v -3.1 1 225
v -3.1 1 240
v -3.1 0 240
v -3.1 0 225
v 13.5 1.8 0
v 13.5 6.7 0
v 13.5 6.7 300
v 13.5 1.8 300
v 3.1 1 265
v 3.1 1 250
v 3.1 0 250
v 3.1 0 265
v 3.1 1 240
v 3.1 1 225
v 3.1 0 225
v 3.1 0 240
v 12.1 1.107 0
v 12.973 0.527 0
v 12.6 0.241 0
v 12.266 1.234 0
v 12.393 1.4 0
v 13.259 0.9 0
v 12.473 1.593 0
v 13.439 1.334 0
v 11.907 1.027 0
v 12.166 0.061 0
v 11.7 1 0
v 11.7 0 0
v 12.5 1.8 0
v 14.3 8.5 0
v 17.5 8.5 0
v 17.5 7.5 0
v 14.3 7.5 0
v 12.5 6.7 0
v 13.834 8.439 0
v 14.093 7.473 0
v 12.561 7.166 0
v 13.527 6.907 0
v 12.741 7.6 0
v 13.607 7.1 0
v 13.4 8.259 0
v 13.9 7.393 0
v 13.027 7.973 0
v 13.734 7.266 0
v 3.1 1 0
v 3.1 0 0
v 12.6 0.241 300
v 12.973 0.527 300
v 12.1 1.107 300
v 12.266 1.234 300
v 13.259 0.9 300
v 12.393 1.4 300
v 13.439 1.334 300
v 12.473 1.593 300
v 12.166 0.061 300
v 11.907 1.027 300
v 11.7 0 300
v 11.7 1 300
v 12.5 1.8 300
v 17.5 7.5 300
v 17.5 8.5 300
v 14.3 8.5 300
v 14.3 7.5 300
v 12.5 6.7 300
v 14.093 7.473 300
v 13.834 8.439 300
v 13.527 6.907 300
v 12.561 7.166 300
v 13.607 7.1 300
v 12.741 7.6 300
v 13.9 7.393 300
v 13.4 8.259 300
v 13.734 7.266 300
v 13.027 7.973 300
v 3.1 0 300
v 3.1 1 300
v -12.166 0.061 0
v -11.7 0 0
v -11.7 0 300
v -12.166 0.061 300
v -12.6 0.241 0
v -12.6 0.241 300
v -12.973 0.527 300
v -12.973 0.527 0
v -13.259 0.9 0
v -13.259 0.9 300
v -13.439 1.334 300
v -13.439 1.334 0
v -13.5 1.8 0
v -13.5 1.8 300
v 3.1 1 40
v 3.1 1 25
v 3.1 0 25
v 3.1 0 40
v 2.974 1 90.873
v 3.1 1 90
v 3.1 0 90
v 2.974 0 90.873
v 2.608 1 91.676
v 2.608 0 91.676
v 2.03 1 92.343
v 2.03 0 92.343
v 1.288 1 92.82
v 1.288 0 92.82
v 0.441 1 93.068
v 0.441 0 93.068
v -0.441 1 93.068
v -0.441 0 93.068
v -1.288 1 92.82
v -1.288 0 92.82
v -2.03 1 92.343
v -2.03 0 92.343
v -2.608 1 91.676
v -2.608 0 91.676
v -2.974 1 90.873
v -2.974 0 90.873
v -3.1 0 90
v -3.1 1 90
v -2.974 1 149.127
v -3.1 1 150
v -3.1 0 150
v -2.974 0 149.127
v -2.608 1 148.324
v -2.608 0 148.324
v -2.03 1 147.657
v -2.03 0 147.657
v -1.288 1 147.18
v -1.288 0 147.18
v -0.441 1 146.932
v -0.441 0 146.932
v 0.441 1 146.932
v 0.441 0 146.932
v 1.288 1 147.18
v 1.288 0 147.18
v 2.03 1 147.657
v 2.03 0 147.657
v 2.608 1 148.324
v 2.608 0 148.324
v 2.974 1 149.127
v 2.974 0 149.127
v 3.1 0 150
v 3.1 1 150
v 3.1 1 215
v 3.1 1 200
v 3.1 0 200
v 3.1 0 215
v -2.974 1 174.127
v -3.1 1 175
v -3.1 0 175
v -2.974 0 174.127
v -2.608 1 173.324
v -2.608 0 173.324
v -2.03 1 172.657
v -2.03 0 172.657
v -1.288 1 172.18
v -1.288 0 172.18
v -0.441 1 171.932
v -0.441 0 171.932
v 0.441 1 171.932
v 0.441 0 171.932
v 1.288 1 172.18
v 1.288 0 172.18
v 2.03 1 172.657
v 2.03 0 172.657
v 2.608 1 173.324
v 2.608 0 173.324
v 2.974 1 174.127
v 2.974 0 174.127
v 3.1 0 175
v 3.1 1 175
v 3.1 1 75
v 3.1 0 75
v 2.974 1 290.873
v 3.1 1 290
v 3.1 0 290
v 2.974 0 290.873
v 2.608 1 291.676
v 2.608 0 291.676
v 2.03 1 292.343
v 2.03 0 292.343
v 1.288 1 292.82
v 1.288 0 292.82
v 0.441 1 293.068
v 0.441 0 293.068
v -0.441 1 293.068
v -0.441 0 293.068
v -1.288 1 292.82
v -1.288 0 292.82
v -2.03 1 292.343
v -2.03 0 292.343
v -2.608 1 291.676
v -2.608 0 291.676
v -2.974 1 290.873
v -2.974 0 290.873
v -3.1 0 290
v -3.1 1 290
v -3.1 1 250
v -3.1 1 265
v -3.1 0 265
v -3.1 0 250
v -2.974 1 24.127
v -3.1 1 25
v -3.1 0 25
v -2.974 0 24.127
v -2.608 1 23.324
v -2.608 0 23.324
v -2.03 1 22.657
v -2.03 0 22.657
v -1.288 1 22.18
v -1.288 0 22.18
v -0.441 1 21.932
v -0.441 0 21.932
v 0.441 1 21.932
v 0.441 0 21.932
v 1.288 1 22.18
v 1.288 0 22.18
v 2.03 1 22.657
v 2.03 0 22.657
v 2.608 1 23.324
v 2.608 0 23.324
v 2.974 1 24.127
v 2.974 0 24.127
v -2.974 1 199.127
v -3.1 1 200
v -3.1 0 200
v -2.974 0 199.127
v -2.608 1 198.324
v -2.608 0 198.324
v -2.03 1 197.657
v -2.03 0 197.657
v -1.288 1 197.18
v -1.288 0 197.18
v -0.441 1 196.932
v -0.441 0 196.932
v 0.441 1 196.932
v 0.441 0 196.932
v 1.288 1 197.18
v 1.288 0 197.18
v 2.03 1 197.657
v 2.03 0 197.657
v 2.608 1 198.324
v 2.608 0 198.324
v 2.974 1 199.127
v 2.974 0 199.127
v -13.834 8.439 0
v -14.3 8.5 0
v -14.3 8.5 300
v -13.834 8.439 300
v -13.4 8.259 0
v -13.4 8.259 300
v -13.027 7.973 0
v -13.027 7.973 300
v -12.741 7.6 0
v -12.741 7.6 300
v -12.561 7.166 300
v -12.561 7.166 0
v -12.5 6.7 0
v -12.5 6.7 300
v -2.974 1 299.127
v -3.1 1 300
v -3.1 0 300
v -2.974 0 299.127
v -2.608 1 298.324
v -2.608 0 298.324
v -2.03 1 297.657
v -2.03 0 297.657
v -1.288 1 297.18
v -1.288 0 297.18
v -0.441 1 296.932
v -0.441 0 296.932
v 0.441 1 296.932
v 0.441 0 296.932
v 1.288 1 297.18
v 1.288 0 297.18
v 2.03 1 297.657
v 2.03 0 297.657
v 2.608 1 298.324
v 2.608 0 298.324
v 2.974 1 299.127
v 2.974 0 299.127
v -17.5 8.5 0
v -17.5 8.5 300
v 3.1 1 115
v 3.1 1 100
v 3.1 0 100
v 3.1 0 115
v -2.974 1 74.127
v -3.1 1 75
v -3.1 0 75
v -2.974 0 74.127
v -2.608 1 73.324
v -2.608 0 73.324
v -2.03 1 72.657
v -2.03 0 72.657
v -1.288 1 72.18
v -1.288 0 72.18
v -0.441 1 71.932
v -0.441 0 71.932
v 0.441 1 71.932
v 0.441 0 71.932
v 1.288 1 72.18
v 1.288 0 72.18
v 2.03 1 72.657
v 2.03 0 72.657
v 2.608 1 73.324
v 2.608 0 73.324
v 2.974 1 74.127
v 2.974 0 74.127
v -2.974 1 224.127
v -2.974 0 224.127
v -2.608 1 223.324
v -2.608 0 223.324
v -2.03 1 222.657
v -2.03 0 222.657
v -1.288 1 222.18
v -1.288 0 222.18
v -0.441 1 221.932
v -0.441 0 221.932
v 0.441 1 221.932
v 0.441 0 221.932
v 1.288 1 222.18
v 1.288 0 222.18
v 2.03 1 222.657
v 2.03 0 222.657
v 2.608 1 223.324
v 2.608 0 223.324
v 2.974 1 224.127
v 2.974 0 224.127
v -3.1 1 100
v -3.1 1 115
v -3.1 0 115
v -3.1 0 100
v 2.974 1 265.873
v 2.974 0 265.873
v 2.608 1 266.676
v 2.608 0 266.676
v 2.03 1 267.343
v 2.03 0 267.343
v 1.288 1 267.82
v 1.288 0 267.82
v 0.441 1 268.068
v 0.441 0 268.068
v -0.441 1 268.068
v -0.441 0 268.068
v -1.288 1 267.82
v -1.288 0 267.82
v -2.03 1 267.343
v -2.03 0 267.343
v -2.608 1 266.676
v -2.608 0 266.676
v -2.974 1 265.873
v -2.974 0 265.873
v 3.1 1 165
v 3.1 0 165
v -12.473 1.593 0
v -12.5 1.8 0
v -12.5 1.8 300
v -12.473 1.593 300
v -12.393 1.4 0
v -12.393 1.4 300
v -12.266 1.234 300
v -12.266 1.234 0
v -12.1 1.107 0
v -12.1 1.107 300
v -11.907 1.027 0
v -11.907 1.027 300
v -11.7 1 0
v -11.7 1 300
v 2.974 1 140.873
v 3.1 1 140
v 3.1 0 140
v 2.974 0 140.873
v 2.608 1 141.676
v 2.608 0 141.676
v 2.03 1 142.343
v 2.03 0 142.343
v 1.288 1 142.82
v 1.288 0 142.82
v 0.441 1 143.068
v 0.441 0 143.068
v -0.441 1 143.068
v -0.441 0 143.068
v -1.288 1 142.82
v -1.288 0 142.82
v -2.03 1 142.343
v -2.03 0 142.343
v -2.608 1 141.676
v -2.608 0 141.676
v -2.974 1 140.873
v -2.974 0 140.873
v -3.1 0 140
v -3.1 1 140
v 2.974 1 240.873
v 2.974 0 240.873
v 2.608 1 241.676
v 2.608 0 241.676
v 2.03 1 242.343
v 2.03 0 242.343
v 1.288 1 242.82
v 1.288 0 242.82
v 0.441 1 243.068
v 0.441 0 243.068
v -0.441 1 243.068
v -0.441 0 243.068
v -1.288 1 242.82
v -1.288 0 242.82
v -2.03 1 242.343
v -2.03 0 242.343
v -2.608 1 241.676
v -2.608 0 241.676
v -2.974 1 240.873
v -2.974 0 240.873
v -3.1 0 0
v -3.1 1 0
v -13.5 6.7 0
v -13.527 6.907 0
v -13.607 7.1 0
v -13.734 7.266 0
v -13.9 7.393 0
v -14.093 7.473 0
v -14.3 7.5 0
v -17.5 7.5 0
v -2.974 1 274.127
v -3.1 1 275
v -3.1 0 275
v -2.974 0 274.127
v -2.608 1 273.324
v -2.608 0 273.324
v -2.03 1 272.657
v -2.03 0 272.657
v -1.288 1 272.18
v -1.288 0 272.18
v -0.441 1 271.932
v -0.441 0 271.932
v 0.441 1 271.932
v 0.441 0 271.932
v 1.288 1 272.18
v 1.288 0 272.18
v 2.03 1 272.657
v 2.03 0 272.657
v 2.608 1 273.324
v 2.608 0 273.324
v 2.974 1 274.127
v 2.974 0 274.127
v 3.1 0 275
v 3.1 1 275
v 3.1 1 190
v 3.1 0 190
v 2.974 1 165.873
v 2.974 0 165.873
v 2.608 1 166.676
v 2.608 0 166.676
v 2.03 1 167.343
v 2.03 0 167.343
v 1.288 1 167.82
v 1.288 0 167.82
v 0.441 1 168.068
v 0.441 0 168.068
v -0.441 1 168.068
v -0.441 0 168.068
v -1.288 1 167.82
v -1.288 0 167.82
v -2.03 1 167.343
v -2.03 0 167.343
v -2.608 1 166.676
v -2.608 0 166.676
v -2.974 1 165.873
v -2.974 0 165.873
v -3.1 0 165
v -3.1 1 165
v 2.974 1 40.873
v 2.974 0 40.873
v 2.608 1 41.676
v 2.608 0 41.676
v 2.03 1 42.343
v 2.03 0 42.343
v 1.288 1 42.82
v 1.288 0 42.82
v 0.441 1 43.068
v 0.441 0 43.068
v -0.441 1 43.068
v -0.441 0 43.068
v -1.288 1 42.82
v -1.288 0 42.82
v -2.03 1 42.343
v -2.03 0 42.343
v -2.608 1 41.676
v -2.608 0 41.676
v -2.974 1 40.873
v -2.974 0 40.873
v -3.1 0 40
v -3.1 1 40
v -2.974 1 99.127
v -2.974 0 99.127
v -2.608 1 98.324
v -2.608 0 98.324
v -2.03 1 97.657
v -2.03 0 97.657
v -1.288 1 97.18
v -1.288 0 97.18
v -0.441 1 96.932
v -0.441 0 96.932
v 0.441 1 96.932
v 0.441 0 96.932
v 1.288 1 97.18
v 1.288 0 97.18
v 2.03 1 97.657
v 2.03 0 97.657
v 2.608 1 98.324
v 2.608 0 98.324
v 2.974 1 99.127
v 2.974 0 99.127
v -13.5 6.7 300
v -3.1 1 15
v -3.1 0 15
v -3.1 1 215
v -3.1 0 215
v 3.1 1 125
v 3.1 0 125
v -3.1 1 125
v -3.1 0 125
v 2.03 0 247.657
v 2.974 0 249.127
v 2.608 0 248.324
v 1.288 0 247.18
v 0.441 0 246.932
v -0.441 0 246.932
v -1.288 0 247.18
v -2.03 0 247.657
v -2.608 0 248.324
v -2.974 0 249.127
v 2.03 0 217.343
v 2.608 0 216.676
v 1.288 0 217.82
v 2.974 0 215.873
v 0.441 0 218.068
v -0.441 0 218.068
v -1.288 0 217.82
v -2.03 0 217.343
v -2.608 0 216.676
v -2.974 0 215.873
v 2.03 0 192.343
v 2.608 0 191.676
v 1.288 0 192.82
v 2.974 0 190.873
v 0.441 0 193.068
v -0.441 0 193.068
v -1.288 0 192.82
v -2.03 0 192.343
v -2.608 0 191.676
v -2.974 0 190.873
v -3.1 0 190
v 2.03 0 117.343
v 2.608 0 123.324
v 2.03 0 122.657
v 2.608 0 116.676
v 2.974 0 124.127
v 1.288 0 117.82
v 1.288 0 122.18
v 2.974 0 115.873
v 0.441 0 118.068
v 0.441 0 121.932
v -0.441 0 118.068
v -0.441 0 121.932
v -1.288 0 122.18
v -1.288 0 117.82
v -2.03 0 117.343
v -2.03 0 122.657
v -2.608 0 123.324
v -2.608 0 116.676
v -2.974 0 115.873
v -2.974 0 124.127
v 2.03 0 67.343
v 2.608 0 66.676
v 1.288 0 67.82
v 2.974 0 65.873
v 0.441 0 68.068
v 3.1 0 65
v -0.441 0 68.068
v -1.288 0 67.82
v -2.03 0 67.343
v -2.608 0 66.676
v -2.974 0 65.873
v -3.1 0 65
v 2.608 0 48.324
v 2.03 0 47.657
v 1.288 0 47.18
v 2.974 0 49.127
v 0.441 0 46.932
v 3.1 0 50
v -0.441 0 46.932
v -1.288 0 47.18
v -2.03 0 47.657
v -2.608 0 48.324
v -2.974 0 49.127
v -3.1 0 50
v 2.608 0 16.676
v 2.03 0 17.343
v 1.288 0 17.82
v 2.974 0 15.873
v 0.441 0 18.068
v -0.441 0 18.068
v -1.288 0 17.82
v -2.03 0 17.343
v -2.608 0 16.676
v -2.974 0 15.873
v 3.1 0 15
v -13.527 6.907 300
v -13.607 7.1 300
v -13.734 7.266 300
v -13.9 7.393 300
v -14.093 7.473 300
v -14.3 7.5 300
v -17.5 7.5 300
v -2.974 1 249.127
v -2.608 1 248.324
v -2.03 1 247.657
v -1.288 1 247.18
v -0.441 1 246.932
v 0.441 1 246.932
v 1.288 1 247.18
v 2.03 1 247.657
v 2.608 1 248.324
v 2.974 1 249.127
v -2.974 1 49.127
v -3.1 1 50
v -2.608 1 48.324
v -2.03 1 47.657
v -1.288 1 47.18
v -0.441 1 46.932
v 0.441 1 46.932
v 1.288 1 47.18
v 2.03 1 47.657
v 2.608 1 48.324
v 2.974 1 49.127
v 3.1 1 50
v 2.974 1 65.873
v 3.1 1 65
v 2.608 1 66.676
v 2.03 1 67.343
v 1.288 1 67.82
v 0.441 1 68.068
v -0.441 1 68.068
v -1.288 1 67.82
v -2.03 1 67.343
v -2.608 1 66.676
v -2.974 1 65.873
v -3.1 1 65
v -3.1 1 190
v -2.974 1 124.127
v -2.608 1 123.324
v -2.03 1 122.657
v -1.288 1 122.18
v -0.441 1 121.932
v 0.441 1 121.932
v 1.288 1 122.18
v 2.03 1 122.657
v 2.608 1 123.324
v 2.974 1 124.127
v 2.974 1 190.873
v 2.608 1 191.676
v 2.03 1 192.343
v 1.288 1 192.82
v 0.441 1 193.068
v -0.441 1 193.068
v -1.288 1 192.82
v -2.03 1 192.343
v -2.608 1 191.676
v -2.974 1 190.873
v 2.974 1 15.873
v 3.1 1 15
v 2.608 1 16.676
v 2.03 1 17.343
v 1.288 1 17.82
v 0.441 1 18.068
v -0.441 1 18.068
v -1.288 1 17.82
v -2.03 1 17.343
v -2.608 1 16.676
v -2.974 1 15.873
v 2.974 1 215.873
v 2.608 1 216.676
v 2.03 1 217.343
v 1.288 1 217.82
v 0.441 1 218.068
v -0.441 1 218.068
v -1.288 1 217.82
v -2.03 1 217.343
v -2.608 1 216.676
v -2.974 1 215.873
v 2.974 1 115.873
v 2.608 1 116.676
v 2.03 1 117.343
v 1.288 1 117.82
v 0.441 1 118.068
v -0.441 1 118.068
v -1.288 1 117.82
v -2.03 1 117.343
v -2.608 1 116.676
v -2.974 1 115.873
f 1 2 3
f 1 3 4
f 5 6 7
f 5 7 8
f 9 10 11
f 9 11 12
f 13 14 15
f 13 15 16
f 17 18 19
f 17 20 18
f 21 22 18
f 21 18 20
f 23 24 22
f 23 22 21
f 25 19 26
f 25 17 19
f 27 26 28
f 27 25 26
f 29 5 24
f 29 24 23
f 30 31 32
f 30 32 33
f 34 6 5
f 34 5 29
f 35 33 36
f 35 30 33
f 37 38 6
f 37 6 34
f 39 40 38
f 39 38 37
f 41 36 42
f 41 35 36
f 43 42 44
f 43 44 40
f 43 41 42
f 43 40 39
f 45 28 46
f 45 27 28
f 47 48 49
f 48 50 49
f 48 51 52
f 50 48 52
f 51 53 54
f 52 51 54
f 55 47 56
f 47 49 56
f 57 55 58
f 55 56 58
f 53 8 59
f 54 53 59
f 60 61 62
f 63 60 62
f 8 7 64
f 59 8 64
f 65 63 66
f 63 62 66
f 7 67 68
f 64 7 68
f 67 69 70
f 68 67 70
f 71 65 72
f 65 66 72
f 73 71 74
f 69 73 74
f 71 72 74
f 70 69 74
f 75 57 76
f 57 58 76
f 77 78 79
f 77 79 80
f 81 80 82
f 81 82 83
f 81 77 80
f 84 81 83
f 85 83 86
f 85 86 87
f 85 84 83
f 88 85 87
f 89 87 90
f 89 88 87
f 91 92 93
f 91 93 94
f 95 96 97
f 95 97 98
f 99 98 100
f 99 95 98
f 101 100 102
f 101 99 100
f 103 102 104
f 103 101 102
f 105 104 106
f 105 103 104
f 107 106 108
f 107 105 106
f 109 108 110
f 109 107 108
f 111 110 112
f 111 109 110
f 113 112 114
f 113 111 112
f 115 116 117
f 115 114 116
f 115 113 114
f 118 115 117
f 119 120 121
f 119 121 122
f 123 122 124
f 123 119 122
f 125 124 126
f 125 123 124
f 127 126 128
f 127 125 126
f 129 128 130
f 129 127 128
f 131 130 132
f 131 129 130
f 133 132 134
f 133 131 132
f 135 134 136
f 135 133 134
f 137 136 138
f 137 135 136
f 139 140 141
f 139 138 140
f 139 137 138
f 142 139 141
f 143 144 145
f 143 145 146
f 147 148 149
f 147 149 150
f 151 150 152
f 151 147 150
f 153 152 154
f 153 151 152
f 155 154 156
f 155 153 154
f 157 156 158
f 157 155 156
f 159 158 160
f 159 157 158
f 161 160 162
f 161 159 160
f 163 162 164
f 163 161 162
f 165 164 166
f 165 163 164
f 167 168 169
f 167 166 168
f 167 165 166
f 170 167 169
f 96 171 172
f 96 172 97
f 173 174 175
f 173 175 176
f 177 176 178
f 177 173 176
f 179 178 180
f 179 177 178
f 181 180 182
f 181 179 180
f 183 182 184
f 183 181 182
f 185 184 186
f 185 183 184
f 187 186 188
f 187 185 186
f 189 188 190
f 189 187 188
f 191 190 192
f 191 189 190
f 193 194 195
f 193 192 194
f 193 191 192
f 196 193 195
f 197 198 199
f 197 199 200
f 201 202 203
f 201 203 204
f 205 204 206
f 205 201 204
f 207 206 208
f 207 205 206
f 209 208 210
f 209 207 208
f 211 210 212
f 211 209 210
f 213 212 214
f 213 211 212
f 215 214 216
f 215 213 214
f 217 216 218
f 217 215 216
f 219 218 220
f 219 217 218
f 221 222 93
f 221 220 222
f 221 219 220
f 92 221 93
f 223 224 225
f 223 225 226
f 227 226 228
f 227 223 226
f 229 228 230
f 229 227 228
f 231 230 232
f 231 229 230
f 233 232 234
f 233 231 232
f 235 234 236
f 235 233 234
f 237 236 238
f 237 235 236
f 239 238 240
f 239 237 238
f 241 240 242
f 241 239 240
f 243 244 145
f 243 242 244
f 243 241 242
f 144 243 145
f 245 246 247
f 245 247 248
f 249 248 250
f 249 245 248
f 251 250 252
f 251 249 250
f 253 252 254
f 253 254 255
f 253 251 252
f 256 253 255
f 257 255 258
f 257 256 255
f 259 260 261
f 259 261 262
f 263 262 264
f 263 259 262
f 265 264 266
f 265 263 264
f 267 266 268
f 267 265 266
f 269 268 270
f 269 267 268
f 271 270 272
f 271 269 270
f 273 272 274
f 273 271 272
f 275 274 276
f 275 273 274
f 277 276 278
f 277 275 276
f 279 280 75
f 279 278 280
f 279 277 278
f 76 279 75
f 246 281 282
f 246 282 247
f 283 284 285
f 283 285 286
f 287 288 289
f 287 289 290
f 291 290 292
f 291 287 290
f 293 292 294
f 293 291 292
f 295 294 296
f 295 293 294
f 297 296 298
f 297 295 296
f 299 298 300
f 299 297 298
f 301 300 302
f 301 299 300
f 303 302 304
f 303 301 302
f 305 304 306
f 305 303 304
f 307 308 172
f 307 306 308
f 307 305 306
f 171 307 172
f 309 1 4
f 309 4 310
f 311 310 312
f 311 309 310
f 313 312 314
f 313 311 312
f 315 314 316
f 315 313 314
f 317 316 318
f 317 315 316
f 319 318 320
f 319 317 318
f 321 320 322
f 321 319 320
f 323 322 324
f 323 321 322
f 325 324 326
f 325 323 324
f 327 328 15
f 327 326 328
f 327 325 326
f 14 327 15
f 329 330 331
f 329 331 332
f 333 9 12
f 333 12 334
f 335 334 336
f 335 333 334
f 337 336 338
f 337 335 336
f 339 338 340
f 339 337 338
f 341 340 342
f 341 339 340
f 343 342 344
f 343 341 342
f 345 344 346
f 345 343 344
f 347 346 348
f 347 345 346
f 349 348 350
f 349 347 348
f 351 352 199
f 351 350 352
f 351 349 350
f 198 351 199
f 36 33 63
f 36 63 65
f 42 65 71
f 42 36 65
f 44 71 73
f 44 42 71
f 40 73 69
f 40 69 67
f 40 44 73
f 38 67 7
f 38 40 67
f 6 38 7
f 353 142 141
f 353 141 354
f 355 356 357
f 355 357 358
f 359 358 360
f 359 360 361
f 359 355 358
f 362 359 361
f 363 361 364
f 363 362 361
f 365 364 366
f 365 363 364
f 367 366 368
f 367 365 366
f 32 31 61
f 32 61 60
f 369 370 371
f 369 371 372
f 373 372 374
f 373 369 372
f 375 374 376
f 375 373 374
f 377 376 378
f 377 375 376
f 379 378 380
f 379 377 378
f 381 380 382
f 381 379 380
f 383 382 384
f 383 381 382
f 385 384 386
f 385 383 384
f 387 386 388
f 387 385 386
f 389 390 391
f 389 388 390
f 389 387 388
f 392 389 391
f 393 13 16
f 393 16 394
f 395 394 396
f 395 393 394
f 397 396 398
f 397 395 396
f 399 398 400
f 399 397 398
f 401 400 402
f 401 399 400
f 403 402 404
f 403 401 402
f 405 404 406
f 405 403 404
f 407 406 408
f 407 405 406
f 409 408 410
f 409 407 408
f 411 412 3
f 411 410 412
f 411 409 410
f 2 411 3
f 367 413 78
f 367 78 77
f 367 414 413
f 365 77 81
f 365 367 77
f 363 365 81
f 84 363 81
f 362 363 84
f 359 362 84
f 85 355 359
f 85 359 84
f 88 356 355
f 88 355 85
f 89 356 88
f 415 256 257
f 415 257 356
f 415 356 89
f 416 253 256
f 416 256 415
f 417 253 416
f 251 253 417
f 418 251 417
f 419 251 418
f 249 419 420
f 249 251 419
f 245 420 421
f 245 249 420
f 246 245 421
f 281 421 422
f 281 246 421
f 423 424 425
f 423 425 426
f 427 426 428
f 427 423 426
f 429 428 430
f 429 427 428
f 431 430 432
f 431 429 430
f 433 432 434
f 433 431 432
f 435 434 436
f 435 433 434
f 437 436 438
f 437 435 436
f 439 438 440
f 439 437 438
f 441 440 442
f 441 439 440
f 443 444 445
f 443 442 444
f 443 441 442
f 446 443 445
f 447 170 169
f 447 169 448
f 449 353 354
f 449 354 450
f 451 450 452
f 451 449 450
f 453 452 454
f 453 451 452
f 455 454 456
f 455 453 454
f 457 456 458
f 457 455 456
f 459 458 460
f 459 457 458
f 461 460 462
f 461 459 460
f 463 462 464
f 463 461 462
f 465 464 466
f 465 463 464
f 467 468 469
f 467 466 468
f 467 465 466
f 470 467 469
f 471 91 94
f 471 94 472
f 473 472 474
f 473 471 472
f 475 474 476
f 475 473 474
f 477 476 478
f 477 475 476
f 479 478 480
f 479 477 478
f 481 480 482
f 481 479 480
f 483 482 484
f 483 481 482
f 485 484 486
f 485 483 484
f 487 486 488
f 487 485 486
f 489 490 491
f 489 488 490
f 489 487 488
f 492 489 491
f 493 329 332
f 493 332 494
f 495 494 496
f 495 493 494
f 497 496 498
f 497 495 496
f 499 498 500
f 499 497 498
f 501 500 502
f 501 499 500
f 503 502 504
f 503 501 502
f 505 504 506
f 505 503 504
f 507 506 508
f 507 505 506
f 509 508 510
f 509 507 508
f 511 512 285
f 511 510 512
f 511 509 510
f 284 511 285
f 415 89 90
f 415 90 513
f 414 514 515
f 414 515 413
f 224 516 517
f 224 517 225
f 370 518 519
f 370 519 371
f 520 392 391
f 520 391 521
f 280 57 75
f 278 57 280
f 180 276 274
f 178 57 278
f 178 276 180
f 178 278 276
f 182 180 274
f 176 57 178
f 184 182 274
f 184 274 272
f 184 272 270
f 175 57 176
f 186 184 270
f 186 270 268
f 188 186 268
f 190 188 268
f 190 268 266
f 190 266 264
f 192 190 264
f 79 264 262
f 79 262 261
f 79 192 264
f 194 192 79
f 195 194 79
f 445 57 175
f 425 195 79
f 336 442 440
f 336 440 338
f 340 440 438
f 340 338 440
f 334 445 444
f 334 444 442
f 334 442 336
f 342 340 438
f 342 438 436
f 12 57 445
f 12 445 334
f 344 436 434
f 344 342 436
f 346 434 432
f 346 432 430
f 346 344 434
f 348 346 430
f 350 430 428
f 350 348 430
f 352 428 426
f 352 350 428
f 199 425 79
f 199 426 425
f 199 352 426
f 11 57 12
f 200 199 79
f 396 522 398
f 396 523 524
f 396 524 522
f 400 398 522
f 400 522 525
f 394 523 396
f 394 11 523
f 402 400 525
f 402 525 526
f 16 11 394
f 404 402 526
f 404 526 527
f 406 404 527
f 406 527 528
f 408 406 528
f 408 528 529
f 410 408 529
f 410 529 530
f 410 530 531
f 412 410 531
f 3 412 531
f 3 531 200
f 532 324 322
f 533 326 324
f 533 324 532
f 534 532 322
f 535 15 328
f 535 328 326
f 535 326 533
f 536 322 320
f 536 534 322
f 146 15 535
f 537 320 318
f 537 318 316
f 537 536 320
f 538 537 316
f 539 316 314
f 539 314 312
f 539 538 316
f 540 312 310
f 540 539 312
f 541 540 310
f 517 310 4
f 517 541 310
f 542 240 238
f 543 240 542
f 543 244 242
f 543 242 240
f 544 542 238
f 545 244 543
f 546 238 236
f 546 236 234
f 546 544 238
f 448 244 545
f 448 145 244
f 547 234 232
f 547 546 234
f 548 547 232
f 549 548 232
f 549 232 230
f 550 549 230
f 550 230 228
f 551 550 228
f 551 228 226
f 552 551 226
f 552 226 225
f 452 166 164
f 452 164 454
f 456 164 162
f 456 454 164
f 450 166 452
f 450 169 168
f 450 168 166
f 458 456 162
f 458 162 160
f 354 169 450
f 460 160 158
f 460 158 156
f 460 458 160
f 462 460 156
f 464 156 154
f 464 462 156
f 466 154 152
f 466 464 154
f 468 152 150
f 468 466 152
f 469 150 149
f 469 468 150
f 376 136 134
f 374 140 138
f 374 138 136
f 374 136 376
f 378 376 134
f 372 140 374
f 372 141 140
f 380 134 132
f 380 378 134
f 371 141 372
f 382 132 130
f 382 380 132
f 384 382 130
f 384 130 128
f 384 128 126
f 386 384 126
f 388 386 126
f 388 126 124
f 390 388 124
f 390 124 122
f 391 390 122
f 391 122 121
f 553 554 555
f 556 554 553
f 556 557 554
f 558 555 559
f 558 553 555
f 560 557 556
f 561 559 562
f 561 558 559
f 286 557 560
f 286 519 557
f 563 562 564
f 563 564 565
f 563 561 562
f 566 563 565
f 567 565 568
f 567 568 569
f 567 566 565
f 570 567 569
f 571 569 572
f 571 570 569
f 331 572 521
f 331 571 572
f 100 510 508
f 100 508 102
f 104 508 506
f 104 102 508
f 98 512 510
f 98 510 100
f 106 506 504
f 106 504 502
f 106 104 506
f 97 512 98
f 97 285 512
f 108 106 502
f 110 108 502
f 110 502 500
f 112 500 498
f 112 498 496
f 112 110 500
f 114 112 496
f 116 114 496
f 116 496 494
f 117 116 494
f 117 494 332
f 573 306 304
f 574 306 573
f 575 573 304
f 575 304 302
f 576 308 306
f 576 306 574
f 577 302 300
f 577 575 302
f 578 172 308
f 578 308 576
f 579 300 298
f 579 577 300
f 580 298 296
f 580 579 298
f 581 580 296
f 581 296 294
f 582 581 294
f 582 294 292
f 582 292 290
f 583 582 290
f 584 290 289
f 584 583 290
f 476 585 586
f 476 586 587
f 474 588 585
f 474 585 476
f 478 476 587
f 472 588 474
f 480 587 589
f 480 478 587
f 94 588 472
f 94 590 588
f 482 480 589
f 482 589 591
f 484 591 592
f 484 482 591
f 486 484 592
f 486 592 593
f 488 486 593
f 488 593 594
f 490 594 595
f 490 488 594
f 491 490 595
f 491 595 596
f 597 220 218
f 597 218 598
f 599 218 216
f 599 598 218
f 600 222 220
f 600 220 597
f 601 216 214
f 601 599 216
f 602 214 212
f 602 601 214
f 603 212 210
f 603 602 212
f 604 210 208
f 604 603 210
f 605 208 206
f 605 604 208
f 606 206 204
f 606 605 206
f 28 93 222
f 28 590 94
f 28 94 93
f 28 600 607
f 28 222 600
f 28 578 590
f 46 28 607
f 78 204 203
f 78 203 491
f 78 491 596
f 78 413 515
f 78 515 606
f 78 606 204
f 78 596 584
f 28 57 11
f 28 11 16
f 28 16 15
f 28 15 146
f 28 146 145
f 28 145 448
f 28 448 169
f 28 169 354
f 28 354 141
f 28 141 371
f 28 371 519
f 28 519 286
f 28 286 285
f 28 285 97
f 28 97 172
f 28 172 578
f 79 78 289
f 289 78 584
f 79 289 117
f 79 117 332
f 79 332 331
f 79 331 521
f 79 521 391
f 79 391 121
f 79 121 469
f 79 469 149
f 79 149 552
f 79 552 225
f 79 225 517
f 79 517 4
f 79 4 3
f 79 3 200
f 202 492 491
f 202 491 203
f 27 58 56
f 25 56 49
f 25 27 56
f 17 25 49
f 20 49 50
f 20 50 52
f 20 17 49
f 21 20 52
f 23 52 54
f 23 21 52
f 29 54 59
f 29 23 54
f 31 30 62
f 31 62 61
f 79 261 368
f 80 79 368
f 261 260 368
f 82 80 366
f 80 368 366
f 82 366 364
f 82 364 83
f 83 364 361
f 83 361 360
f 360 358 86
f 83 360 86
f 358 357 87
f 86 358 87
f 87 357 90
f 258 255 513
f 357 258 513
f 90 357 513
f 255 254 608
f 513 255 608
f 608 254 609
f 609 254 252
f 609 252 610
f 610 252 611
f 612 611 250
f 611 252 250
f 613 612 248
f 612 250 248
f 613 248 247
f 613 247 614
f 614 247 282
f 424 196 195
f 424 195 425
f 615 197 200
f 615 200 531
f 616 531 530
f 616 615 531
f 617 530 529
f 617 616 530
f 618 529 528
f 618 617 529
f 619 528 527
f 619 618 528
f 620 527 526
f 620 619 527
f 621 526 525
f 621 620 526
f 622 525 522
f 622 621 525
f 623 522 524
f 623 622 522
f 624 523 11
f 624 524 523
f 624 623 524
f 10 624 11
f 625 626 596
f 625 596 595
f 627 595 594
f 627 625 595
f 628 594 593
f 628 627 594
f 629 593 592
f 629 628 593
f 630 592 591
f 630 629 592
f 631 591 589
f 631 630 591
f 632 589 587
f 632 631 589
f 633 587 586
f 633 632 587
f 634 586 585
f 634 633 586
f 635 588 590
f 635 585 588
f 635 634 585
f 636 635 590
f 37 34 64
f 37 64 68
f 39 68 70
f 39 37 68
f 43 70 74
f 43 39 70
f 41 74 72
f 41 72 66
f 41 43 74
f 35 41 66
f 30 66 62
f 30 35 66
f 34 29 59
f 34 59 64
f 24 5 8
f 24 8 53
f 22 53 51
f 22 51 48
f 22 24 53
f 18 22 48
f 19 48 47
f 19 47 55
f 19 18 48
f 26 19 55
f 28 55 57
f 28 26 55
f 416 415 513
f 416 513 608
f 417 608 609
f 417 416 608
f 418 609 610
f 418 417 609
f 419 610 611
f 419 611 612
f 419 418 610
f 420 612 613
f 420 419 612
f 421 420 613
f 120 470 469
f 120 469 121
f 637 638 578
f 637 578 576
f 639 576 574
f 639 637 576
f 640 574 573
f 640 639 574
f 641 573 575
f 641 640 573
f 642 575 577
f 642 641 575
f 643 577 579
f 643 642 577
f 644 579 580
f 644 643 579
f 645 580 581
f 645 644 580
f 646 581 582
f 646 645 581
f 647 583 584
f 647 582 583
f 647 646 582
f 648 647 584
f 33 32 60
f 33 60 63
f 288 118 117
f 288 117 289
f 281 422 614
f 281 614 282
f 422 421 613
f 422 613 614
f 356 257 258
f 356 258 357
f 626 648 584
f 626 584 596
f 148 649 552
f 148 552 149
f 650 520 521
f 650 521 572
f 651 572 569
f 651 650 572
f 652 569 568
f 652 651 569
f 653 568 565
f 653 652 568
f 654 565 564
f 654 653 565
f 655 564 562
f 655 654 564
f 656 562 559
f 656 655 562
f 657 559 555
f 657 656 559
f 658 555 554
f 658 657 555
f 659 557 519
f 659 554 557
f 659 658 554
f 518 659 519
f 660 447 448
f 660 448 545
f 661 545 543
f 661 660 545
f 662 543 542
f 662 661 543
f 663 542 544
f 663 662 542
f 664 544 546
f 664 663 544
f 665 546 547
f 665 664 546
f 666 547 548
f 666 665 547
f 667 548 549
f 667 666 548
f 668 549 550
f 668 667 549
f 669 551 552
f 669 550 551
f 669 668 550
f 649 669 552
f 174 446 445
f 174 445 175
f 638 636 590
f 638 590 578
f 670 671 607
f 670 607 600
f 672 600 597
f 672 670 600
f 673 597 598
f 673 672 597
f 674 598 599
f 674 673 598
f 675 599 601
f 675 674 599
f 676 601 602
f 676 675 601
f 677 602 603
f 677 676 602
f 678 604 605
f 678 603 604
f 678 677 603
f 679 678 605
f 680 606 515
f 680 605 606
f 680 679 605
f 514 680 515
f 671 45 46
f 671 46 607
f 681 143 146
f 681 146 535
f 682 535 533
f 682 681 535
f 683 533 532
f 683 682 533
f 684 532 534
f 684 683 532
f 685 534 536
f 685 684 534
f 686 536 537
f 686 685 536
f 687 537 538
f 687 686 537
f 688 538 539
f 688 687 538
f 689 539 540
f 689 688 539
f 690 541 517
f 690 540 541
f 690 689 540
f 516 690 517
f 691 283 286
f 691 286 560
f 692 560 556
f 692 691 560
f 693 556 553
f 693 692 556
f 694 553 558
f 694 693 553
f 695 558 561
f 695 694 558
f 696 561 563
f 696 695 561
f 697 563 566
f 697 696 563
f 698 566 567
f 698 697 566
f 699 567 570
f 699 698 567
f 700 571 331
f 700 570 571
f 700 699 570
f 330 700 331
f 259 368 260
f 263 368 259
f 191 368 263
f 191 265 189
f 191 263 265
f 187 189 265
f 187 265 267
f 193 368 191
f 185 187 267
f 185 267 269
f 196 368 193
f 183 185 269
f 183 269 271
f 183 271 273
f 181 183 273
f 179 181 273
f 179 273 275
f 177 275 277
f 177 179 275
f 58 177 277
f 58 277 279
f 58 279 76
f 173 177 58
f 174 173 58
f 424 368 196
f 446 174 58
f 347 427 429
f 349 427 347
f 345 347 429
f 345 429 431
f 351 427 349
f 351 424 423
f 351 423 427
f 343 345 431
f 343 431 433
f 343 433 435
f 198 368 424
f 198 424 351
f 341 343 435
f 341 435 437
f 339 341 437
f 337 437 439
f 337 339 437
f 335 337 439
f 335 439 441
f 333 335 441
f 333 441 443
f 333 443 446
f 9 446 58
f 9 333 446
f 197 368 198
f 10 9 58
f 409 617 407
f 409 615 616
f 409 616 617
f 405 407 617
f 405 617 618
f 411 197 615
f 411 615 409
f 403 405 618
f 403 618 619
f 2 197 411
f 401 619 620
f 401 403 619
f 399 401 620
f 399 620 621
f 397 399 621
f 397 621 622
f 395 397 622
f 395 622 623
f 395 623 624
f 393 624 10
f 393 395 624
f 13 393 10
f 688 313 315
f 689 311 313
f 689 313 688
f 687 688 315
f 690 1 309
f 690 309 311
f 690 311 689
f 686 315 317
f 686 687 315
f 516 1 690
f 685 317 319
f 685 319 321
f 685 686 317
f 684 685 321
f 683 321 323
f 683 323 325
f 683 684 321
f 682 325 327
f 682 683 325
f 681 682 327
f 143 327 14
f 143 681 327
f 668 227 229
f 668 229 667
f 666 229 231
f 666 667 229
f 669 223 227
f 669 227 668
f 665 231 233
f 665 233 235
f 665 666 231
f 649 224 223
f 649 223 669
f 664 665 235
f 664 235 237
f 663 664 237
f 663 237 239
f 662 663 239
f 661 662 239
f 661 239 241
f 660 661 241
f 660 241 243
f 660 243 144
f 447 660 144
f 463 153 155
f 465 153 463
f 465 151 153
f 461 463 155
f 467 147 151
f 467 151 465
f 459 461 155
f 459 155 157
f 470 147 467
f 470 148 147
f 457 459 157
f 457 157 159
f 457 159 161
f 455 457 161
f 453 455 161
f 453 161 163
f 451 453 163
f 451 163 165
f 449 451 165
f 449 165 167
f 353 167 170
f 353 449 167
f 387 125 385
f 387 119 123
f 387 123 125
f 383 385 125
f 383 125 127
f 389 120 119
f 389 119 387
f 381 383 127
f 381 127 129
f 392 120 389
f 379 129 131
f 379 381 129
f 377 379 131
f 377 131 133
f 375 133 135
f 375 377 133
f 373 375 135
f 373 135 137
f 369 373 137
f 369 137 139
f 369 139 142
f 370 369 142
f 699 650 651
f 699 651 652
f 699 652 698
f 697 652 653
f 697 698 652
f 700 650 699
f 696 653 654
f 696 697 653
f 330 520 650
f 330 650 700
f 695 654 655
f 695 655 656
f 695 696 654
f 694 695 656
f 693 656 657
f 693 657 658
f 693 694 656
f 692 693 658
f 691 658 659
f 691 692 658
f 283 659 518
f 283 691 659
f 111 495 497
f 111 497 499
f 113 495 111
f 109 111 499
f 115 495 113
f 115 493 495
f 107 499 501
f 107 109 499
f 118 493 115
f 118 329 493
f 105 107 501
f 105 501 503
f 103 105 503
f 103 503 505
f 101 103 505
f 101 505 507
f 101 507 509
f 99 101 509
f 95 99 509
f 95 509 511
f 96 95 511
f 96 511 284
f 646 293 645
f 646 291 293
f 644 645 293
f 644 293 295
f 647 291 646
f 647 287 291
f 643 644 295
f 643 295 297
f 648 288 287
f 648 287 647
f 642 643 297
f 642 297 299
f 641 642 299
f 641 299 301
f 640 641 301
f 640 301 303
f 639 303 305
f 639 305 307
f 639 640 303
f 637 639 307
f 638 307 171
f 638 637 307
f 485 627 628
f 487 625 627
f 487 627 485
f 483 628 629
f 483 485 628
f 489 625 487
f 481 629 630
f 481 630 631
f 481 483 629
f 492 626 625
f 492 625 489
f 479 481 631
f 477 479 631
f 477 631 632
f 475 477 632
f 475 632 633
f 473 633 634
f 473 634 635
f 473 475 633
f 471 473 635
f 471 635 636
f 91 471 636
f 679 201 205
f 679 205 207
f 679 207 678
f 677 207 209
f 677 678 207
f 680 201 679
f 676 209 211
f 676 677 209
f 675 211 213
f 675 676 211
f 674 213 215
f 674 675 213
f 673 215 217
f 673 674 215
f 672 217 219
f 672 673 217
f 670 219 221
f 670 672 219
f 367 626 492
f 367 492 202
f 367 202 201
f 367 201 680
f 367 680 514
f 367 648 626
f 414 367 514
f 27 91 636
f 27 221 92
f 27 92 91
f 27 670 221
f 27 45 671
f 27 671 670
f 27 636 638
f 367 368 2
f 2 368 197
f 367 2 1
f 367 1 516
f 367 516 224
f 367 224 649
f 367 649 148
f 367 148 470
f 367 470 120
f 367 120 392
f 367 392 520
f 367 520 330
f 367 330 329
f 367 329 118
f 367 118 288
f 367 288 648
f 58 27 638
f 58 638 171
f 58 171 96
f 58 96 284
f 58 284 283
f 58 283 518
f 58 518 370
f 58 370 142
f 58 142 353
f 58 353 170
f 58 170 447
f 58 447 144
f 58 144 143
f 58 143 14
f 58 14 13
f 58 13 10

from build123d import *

# Parameters (mm, degrees)
BOSS_EXTRUDE2_DEPTH = 300
CUT_EXTRUDE1_DEPTH  = 100


with BuildPart() as part:
    # Sketch1 → Boss-Extrude2 (new body)
    with BuildSketch(Plane.XY):
        with BuildLine():
            Line((0, 0), (-11.7, 0))
            ThreePointArc((-11.7, 0), (-12.972792206, 0.527207794), (-13.5, 1.8))
            Line((-13.5, 1.8), (-13.5, 6.7))
            ThreePointArc((-13.5, 6.7), (-13.734314575, 7.265685425), (-14.3, 7.5))
            Line((-14.3, 7.5), (-17.5, 7.5))
            Line((-17.5, 7.5), (-17.5, 8.5))
            Line((-17.5, 8.5), (-14.3, 8.5))
            ThreePointArc((-14.3, 8.5), (-13.027207794, 7.972792206), (-12.5, 6.7))
            Line((-12.5, 6.7), (-12.5, 1.8))
            ThreePointArc((-12.5, 1.8), (-12.265685425, 1.234314575), (-11.7, 1))
            Line((-11.7, 1), (0, 1))
            Line((0, 1), (11.7, 1))
            ThreePointArc((11.7, 1), (12.265685425, 1.234314575), (12.5, 1.8))
            Line((12.5, 1.8), (12.5, 6.7))
            ThreePointArc((12.5, 6.7), (13.027207794, 7.972792206), (14.3, 8.5))
            Line((14.3, 8.5), (17.5, 8.5))
            Line((17.5, 8.5), (17.5, 7.5))
            Line((17.5, 7.5), (14.3, 7.5))
            ThreePointArc((14.3, 7.5), (13.734314575, 7.265685425), (13.5, 6.7))
            Line((13.5, 6.7), (13.5, 1.8))
            ThreePointArc((13.5, 1.8), (12.972792206, 0.527207794), (11.7, 0))
            Line((11.7, 0), (0, 0))
        make_face()
    extrude(amount=BOSS_EXTRUDE2_DEPTH)

    # Sketch2 → Cut-Extrude1 (cut)
    with BuildSketch(Plane(origin=(0, 1, 0), x_dir=(1, 0, 0), z_dir=(0, 1, 0))):
        with BuildLine():
            Line((-3.1, -290), (-3.1, -275))
            ThreePointArc((-3.1, -275), (0, -271.9), (3.1, -275))
            Line((3.1, -275), (3.1, -290))
            ThreePointArc((3.1, -290), (0, -293.1), (-3.1, -290))
        make_face()
        with BuildLine():
            Line((-3.1, -265), (-3.1, -250))
            ThreePointArc((-3.1, -250), (0, -246.9), (3.1, -250))
            Line((3.1, -250), (3.1, -265))
            ThreePointArc((3.1, -265), (0, -268.1), (-3.1, -265))
        make_face()
        with BuildLine():
            Line((-3.1, -240), (-3.1, -225))
            ThreePointArc((-3.1, -225), (0, -221.9), (3.1, -225))
            Line((3.1, -225), (3.1, -240))
            ThreePointArc((3.1, -240), (0, -243.1), (-3.1, -240))
        make_face()
        with BuildLine():
            Line((-3.1, -215), (-3.1, -200))
            ThreePointArc((-3.1, -200), (0, -196.9), (3.1, -200))
            Line((3.1, -200), (3.1, -215))
            ThreePointArc((3.1, -215), (0, -218.1), (-3.1, -215))
        make_face()
        with BuildLine():
            Line((-3.1, -315), (-3.1, -300))
            ThreePointArc((-3.1, -300), (0, -296.9), (3.1, -300))
            Line((3.1, -300), (3.1, -315))
            ThreePointArc((3.1, -315), (0, -318.1), (-3.1, -315))
        make_face()
        with BuildLine():
            Line((-3.1, -190), (-3.1, -175))
            ThreePointArc((-3.1, -175), (0, -171.9), (3.1, -175))
            Line((3.1, -175), (3.1, -190))
            ThreePointArc((3.1, -190), (0, -193.1), (-3.1, -190))
        make_face()
        with BuildLine():
            Line((-3.1, -165), (-3.1, -150))
            ThreePointArc((-3.1, -150), (0, -146.9), (3.1, -150))
            Line((3.1, -150), (3.1, -165))
            ThreePointArc((3.1, -165), (0, -168.1), (-3.1, -165))
        make_face()
        with BuildLine():
            Line((-3.1, -140), (-3.1, -125))
            ThreePointArc((-3.1, -125), (0, -121.9), (3.1, -125))
            Line((3.1, -125), (3.1, -140))
            ThreePointArc((3.1, -140), (0, -143.1), (-3.1, -140))
        make_face()
        with BuildLine():
            Line((-3.1, -115), (-3.1, -100))
            ThreePointArc((-3.1, -100), (0, -96.9), (3.1, -100))
            Line((3.1, -100), (3.1, -115))
            ThreePointArc((3.1, -115), (0, -118.1), (-3.1, -115))
        make_face()
        with BuildLine():
            Line((-3.1, -90), (-3.1, -75))
            ThreePointArc((-3.1, -75), (0, -71.9), (3.1, -75))
            Line((3.1, -75), (3.1, -90))
            ThreePointArc((3.1, -90), (0, -93.1), (-3.1, -90))
        make_face()
        with BuildLine():
            Line((-3.1, -65), (-3.1, -50))
            ThreePointArc((-3.1, -50), (0, -46.9), (3.1, -50))
            Line((3.1, -50), (3.1, -65))
            ThreePointArc((3.1, -65), (0, -68.1), (-3.1, -65))
        make_face()
        with BuildLine():
            Line((-3.1, -40), (-3.1, -25))
            ThreePointArc((-3.1, -25), (0, -21.9), (3.1, -25))
            Line((3.1, -25), (3.1, -40))
            ThreePointArc((3.1, -40), (0, -43.1), (-3.1, -40))
        make_face()
        with BuildLine():
            Line((-3.1, -15), (-3.1, 0))
            ThreePointArc((-3.1, 0), (0, 3.1), (3.1, 0))
            Line((3.1, 0), (3.1, -15))
            ThreePointArc((3.1, -15), (0, -18.1), (-3.1, -15))
        make_face()
    extrude(amount=-CUT_EXTRUDE1_DEPTH, mode=Mode.SUBTRACT)


solid = part.part
